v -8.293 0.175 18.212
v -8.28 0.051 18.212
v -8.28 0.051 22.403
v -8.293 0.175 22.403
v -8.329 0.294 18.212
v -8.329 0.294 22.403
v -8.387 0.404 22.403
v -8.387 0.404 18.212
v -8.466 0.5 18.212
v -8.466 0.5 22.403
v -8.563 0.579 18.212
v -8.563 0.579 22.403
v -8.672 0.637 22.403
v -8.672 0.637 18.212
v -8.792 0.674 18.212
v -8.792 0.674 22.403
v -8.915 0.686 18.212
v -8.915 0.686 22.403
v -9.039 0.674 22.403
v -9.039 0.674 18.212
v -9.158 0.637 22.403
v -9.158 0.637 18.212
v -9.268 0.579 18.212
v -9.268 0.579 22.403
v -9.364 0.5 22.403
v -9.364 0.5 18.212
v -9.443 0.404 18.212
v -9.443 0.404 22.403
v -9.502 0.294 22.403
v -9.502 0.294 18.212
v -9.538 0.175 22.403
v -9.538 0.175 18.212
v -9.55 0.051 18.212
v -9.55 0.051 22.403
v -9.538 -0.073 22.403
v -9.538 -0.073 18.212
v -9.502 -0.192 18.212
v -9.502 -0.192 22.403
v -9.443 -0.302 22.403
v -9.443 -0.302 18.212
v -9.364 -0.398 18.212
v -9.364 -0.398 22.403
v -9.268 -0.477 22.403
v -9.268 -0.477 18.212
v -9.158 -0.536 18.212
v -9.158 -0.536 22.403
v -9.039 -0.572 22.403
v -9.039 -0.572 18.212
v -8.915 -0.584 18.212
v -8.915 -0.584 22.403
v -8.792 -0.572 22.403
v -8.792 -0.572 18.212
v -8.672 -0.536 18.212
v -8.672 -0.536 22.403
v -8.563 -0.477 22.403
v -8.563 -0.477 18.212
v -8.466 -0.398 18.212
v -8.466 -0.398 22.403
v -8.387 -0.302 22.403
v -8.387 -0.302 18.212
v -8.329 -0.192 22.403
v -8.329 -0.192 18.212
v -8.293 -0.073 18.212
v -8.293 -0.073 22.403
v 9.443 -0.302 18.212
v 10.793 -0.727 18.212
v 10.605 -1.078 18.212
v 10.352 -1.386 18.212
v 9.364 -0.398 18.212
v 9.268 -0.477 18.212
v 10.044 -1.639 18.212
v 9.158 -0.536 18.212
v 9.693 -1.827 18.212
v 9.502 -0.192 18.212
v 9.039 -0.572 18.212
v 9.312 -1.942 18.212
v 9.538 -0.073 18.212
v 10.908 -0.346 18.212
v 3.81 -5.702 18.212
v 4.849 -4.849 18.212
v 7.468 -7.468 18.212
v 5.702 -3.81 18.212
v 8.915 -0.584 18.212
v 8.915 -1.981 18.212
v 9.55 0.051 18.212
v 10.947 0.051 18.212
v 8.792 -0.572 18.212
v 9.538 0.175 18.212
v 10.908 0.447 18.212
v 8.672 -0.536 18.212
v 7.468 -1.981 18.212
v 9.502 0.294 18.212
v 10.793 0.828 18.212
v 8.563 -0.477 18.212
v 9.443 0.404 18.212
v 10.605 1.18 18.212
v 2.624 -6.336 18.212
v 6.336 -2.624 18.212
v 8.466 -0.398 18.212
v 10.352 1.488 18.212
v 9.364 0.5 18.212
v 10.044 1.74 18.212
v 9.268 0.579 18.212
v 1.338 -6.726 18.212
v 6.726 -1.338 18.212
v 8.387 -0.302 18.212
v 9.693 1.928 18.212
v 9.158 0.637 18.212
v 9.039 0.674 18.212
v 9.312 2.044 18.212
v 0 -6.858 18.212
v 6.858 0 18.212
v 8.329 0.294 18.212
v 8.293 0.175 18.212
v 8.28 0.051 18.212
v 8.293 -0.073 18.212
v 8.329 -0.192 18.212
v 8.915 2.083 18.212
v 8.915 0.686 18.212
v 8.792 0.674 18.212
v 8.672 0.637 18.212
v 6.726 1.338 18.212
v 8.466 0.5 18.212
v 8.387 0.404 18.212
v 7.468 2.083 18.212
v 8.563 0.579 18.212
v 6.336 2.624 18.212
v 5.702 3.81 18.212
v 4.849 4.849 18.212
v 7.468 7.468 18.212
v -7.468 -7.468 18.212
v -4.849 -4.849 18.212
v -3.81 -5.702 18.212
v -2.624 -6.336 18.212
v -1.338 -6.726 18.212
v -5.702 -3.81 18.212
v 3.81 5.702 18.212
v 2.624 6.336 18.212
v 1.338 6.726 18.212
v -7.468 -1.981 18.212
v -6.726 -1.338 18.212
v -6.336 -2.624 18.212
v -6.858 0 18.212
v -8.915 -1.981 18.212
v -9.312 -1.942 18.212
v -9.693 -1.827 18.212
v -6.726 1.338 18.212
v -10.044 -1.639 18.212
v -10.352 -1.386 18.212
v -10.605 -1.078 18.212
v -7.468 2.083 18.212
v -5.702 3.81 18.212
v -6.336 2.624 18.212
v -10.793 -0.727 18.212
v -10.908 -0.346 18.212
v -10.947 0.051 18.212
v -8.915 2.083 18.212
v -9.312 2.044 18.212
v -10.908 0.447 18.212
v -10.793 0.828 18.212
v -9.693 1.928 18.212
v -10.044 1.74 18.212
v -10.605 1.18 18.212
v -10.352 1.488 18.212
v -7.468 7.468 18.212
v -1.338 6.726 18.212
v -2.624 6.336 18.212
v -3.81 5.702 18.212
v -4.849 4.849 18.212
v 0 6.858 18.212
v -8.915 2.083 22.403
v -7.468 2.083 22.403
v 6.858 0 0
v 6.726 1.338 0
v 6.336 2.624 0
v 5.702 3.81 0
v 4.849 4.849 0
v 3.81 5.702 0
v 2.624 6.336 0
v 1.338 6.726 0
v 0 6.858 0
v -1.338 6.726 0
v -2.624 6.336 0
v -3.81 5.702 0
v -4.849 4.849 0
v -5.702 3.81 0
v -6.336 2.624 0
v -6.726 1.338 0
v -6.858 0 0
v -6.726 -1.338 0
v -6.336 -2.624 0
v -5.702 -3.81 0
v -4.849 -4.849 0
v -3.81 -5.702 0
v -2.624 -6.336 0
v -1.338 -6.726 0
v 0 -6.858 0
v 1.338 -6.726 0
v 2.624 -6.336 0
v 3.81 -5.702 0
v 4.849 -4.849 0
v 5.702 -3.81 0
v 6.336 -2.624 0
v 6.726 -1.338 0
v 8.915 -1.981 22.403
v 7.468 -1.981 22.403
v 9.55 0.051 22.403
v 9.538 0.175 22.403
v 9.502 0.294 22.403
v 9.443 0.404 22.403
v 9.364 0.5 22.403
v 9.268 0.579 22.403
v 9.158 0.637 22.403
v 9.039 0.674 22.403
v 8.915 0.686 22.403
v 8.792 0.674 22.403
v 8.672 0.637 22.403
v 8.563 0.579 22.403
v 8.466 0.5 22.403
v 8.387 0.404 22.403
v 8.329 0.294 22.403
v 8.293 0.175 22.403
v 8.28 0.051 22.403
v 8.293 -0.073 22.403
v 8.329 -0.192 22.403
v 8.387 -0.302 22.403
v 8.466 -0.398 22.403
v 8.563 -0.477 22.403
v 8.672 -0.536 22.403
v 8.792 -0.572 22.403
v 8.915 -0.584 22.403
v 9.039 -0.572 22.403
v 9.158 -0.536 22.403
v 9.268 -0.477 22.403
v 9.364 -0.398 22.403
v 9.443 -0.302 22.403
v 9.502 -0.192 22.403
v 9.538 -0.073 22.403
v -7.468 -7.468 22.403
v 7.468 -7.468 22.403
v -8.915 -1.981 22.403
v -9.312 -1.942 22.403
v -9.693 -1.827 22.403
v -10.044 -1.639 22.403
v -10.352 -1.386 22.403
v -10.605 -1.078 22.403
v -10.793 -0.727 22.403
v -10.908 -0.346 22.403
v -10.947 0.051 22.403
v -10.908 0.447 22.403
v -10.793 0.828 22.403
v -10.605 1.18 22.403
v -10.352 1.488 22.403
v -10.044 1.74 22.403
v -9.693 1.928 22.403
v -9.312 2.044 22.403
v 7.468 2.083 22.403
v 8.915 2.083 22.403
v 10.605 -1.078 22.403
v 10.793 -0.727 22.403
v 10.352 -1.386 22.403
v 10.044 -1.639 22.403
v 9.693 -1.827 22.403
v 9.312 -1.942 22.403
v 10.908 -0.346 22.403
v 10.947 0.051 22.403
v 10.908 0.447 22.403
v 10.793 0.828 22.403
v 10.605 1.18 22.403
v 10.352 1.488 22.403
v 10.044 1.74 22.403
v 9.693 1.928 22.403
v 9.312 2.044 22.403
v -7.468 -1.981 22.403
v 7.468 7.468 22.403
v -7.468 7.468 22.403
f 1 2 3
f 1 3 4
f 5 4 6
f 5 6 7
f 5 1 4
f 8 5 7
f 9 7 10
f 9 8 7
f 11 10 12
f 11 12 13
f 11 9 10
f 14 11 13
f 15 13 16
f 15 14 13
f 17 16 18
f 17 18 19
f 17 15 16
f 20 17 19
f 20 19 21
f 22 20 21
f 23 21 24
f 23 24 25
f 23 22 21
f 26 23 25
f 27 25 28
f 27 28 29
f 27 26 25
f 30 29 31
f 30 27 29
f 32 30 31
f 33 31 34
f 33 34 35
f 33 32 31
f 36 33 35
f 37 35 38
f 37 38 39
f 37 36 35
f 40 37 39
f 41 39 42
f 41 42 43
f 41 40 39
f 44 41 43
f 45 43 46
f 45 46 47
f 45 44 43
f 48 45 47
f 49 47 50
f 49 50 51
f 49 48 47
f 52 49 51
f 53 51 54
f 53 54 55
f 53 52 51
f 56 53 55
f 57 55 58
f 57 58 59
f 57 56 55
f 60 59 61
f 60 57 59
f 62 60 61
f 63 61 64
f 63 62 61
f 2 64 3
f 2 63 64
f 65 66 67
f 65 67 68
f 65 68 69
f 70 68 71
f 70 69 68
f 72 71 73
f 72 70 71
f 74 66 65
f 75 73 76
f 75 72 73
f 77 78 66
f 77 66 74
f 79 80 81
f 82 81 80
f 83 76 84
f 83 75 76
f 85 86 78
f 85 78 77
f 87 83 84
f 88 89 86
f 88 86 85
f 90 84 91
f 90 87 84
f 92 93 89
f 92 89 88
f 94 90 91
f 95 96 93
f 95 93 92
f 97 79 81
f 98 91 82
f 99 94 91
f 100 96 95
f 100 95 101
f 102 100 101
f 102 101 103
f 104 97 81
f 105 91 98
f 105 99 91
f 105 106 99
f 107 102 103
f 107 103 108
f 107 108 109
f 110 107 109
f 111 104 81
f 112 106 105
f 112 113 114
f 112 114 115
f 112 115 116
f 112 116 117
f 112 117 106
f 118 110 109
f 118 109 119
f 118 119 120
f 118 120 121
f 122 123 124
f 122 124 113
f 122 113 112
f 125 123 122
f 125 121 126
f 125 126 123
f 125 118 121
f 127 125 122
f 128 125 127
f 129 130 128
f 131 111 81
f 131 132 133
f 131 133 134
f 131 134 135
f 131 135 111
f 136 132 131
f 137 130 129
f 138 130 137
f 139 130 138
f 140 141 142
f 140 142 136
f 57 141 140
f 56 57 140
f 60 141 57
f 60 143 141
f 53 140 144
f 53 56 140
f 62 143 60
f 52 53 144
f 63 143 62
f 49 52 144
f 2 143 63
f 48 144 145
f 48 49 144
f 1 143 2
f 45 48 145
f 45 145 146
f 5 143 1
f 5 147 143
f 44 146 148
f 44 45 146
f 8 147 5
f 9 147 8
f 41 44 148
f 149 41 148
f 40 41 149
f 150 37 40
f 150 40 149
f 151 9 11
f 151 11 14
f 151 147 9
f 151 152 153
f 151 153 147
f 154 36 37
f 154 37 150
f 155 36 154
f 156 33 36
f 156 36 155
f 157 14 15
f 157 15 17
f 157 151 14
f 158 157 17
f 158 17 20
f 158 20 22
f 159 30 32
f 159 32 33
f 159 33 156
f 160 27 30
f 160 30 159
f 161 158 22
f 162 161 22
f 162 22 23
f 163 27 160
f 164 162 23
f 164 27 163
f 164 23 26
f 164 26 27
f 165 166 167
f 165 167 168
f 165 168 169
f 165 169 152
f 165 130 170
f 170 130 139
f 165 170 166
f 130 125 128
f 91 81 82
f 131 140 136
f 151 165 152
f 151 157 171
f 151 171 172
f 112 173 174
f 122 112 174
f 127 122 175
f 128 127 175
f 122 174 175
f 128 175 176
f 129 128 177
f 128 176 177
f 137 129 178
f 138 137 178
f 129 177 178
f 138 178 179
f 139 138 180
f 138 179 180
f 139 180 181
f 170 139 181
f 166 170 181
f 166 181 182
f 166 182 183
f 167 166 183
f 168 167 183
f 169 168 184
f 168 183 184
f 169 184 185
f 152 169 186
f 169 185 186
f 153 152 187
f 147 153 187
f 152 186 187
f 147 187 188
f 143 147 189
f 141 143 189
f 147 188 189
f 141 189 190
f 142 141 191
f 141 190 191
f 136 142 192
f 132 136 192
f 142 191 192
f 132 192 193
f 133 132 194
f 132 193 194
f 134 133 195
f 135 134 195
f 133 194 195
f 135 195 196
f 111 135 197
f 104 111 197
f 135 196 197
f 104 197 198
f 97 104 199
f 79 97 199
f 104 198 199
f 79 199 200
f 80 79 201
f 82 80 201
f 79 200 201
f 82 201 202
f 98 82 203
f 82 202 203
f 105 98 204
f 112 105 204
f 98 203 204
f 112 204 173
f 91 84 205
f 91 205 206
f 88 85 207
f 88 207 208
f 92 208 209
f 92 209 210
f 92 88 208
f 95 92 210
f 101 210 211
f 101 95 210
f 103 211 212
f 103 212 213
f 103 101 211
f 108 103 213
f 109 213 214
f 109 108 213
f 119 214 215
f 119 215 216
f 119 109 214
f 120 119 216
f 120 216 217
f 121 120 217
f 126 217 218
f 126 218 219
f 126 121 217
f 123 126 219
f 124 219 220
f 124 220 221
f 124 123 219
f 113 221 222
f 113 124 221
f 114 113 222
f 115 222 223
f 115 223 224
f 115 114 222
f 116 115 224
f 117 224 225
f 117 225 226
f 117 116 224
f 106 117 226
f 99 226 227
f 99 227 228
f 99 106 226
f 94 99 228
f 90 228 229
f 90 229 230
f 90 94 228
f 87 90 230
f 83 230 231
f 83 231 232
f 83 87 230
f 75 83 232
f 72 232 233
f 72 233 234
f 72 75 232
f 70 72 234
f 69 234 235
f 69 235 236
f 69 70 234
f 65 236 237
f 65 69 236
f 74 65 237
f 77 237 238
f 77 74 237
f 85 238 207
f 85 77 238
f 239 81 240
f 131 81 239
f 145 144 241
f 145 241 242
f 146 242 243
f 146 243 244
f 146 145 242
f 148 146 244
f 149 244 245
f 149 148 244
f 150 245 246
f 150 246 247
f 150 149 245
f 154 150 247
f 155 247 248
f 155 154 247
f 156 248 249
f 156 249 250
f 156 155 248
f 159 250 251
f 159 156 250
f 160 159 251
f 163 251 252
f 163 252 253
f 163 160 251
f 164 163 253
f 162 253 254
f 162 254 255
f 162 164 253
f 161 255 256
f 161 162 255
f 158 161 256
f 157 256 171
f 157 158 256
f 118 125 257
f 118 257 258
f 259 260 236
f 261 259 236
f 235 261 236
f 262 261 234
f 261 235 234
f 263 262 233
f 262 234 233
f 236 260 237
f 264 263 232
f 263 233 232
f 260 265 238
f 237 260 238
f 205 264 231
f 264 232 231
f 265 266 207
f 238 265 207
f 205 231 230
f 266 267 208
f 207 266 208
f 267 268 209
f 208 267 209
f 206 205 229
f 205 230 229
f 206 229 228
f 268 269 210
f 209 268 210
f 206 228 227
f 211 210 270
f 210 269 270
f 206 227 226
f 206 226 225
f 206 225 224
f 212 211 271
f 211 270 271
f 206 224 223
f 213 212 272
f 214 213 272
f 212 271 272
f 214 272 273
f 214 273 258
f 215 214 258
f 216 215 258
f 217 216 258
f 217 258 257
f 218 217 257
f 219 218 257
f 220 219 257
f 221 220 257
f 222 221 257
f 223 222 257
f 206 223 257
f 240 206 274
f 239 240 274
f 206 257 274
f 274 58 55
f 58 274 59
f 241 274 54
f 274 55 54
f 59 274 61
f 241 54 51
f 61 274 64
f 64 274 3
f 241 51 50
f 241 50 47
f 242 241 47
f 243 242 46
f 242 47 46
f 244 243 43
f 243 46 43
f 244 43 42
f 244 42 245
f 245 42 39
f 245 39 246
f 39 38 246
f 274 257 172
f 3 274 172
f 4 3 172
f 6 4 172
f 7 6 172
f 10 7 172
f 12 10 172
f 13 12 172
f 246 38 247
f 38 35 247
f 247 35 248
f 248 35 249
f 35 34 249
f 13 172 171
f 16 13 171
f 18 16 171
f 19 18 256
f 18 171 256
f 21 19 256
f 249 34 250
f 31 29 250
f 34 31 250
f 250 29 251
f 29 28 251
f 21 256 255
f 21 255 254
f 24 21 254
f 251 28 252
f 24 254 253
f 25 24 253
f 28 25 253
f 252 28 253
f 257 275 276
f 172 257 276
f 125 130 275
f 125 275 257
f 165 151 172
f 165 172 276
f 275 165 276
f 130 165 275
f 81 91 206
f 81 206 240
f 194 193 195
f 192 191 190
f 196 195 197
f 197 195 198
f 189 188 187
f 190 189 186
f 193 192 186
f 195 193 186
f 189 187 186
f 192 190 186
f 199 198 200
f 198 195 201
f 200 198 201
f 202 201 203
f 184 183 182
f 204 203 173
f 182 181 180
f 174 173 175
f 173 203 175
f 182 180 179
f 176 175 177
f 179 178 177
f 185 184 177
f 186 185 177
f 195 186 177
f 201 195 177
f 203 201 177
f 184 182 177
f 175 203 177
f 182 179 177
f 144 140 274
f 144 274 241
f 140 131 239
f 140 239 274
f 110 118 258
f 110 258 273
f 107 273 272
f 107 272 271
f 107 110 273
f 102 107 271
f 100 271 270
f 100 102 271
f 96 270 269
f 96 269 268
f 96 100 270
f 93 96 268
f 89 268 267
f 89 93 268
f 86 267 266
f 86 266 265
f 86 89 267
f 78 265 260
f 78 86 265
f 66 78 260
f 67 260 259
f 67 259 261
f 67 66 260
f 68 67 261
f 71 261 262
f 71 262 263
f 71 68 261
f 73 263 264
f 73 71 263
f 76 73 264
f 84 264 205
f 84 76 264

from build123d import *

# Parameters (mm, degrees)
SKETCH1_R           = 6.858
BOSS_EXTRUDE1_DEPTH = 18.2118
SKETCH2_R           = 0.635
BOSS_EXTRUDE2_DEPTH = 4.191


with BuildPart() as part:
    # Sketch1 → Boss-Extrude1 (new body)
    with BuildSketch(Plane.XY):
        Circle(SKETCH1_R)
    extrude(amount=BOSS_EXTRUDE1_DEPTH)

    # Sketch2 → Boss-Extrude2 (add)
    with BuildSketch(Plane.XY.offset(18.2118)):
        with BuildLine():
            Line((-7.4676, 7.4676), (7.4676, 7.4676))
            Line((7.4676, 7.4676), (7.4676, 2.0828))
            Line((7.4676, 2.0828), (8.9154, 2.0828))
            ThreePointArc((8.9154, 2.0828), (10.9474, 0.0508), (8.9154, -1.9812))
            Line((8.9154, -1.9812), (7.4676, -1.9812))
            Line((7.4676, -1.9812), (7.4676, -7.4676))
            Line((7.4676, -7.4676), (-7.4676, -7.4676))
            Line((-7.4676, -7.4676), (-7.4676, -1.9812))
            Line((-7.4676, -1.9812), (-8.9154, -1.9812))
            ThreePointArc((-8.9154, -1.9812), (-10.9474, 0.0508), (-8.9154, 2.0828))
            Line((-8.9154, 2.0828), (-7.4676, 2.0828))
            Line((-7.4676, 2.0828), (-7.4676, 7.4676))
        make_face()
        with Locations((-8.9154, 0.0508)):
            Circle(SKETCH2_R, mode=Mode.SUBTRACT)
        with Locations((8.9154, 0.0508)):
            Circle(SKETCH2_R, mode=Mode.SUBTRACT)
    extrude(amount=BOSS_EXTRUDE2_DEPTH)


solid = part.part
